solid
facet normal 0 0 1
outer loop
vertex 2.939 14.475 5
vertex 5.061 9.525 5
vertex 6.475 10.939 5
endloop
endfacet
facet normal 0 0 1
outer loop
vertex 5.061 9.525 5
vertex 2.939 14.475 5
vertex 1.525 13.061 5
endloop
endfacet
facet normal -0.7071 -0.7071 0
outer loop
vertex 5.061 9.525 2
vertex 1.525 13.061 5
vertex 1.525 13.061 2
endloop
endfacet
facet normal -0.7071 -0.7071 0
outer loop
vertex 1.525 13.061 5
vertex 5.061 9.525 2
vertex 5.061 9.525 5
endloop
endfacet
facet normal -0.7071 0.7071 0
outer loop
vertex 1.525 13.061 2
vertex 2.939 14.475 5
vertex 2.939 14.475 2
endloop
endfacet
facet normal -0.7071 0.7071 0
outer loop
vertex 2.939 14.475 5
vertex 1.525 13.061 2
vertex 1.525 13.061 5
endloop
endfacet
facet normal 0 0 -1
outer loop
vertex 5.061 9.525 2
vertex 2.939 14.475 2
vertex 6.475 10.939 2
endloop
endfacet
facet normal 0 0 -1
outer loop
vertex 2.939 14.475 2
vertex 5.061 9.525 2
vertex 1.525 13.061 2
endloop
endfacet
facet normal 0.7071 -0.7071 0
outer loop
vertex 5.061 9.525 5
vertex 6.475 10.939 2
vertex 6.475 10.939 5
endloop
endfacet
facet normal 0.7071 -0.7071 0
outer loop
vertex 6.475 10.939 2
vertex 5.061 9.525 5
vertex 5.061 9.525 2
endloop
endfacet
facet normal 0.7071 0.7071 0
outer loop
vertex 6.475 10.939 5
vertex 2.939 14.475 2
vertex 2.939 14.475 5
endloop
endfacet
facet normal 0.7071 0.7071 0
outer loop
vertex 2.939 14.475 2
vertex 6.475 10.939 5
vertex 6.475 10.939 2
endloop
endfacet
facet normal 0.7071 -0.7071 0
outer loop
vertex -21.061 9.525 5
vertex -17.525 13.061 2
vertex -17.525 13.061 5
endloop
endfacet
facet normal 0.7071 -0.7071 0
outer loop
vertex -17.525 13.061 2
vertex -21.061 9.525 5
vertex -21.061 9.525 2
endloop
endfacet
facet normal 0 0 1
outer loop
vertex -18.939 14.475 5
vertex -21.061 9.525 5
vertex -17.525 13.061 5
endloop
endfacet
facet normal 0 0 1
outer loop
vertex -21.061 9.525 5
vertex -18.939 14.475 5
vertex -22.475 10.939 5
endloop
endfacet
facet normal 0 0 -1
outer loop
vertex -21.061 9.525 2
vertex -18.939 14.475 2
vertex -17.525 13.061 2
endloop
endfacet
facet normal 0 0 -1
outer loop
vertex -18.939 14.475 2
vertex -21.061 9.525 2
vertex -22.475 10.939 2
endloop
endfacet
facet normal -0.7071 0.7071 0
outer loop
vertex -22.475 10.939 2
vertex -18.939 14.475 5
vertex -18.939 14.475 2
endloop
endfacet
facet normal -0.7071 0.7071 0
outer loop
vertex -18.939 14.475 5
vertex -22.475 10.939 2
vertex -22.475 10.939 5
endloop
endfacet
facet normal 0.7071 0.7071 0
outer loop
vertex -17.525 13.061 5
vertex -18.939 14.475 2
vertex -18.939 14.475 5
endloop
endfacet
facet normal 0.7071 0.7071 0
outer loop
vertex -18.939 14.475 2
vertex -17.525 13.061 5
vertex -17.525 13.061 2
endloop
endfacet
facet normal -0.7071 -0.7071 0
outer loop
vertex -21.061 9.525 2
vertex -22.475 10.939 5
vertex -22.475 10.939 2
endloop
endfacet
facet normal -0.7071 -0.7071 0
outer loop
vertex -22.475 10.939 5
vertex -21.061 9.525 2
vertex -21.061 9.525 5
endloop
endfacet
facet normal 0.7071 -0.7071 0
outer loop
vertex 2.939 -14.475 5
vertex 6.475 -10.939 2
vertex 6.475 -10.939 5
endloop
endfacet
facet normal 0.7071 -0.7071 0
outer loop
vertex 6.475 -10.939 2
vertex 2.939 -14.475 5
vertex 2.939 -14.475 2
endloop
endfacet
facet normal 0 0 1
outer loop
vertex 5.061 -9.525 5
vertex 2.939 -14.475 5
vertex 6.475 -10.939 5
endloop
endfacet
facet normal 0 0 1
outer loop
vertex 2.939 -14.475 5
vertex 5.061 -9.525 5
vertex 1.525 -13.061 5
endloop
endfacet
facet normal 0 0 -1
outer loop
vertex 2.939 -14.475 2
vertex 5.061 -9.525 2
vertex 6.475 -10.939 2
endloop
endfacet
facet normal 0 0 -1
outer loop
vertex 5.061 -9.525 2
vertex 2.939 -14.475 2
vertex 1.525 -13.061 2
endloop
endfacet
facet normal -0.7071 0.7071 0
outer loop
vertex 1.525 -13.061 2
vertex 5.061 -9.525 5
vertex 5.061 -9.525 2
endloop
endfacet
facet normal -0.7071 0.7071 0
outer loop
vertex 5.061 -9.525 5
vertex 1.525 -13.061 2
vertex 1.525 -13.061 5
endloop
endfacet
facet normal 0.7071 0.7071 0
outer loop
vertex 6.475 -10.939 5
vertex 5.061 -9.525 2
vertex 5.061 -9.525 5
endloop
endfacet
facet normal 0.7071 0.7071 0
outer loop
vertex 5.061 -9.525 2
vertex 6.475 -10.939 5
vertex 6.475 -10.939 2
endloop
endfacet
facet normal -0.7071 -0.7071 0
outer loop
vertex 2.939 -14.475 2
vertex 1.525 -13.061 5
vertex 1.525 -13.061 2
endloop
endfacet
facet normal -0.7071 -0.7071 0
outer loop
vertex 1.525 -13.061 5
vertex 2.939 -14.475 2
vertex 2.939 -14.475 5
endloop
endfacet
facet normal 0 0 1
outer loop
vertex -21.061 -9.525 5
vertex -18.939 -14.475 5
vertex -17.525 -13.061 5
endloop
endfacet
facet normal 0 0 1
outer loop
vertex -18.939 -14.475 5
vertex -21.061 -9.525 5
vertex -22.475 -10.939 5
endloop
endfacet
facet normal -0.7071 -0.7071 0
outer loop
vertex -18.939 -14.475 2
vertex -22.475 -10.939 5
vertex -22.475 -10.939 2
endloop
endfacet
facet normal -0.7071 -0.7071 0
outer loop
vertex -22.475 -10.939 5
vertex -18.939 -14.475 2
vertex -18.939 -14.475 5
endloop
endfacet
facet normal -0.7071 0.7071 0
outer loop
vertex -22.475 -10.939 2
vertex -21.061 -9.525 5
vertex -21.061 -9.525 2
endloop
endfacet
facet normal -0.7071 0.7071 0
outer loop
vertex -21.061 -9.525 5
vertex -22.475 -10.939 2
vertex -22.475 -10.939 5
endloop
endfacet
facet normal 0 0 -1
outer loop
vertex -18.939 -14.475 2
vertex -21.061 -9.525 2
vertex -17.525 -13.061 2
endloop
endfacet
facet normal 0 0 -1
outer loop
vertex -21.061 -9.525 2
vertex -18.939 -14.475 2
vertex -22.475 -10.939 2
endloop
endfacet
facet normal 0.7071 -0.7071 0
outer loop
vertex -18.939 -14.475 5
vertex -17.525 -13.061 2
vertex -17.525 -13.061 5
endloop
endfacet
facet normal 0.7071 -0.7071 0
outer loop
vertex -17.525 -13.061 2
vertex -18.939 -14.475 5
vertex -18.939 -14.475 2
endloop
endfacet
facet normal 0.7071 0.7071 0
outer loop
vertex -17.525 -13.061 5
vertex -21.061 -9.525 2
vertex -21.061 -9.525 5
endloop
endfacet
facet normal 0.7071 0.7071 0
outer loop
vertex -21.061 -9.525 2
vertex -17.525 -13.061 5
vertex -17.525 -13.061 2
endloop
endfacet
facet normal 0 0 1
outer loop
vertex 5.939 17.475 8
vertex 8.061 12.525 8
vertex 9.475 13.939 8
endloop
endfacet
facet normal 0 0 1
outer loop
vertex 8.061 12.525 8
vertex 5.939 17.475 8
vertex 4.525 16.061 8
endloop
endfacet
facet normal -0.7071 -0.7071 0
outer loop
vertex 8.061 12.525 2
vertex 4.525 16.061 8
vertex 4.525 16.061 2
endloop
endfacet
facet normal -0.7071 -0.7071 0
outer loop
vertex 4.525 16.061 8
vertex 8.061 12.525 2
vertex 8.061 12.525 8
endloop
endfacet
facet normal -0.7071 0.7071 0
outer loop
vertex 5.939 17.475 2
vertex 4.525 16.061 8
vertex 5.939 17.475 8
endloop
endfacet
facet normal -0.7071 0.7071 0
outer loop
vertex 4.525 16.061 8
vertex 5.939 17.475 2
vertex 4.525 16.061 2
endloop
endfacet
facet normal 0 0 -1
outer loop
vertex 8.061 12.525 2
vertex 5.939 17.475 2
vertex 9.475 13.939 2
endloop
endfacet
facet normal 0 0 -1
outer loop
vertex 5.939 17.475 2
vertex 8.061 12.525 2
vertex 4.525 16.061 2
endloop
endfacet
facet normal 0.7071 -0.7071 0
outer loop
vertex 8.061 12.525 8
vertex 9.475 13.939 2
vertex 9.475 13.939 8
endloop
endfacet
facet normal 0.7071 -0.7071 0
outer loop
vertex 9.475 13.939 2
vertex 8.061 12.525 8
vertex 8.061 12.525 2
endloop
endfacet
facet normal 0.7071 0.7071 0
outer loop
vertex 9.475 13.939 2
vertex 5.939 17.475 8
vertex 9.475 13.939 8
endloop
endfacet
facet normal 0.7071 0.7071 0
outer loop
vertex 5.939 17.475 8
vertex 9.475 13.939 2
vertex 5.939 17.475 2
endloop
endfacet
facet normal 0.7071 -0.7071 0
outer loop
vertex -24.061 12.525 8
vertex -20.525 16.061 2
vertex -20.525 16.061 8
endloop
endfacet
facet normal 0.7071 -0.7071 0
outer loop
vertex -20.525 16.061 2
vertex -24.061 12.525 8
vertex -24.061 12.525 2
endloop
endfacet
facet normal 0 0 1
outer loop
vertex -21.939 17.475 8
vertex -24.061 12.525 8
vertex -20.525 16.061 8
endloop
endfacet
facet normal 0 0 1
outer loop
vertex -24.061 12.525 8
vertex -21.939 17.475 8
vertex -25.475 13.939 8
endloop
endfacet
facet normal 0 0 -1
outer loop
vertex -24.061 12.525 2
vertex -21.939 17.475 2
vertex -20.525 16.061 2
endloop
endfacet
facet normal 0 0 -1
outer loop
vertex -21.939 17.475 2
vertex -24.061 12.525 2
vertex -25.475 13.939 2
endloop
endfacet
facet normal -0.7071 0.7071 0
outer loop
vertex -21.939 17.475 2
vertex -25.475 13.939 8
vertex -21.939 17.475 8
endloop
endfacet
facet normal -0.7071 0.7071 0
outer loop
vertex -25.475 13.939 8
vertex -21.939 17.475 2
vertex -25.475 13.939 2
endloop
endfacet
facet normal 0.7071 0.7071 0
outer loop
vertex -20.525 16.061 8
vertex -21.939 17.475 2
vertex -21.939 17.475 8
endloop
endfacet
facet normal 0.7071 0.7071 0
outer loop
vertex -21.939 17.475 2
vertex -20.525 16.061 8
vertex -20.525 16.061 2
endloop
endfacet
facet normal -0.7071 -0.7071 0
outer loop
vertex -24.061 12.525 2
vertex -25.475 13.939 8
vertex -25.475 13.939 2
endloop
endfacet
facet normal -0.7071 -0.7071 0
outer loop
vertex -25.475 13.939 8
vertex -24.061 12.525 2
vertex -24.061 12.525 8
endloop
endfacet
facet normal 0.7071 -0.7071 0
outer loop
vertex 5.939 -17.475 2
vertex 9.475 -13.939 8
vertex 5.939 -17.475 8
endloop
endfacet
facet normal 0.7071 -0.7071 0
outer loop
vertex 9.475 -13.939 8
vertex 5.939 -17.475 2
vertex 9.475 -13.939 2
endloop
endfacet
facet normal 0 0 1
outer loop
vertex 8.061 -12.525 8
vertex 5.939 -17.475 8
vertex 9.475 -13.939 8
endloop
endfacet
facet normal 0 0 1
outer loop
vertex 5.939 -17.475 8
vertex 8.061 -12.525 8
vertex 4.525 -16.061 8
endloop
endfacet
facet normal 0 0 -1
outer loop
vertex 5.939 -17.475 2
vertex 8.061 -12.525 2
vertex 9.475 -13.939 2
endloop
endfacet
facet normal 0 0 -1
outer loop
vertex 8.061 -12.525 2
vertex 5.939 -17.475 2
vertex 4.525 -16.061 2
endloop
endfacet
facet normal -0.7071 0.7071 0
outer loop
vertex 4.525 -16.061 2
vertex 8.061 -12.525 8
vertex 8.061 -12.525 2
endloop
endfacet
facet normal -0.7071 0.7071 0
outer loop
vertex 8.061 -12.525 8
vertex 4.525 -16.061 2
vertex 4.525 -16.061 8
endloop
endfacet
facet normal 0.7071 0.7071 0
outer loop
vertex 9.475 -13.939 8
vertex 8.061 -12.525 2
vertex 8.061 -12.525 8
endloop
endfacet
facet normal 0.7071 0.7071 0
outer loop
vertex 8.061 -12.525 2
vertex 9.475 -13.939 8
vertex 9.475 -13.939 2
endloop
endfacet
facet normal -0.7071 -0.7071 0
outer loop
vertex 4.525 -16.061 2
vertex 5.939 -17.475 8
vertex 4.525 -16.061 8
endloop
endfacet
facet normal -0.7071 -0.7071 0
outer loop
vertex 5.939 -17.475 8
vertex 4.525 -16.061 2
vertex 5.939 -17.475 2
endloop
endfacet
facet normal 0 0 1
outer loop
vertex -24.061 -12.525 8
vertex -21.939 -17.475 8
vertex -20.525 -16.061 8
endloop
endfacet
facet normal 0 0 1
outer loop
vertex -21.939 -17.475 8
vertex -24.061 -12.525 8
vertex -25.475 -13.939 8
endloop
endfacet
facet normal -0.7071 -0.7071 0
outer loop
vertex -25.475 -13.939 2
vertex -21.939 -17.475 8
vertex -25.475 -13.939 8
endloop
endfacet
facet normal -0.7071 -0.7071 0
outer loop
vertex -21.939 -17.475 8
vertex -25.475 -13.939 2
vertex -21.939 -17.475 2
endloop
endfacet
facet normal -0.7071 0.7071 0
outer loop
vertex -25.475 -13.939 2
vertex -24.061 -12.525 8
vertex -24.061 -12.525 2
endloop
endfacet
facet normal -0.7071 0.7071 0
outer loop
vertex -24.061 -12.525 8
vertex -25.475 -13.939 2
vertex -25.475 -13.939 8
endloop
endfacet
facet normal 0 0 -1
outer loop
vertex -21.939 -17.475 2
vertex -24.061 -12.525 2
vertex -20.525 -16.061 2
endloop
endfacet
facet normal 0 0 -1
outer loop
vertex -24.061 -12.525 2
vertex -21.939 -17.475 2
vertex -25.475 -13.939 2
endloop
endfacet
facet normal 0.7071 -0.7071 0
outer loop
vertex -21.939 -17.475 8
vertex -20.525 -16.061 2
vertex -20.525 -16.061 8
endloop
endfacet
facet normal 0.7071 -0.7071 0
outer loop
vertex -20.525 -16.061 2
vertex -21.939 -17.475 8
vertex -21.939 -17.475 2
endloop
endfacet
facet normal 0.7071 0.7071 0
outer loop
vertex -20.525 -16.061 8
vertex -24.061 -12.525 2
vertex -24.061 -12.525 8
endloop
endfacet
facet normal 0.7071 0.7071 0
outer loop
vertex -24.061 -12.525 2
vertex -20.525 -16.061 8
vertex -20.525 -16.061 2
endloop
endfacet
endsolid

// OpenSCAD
$fn = 100;

rotate_extrude()
    import(file = "boitier-joystick-bas-moitie.dxf",layer = "0");

module petit_picot() {
   translate([0, 0, 1.5]) cube([2, 5, 3], center = true);
}

module grand_picot() {
   translate([0, 0, 3]) cube([2, 5, 6], center = true);
}

module picots() {
    translate([12 , 12,  0]) rotate([0, 0, 45]) petit_picot();
    translate([-12 , 12,  0]) rotate([0, 0, -45]) petit_picot();
    translate([12 , -12,  0]) rotate([0, 0, -45]) petit_picot();
    translate([-12 , -12,  0]) rotate([0, 0, 45]) petit_picot();

    translate([15 , 15,  0]) rotate([0, 0, 45]) grand_picot();
    translate([-15 , 15,  0]) rotate([0, 0, -45]) grand_picot();
    translate([15 , -15,  0]) rotate([0, 0, -45]) grand_picot();
    translate([-15 , -15,  0]) rotate([0, 0, 45]) grand_picot();
}

translate([-8, 0, 2]) picots();
